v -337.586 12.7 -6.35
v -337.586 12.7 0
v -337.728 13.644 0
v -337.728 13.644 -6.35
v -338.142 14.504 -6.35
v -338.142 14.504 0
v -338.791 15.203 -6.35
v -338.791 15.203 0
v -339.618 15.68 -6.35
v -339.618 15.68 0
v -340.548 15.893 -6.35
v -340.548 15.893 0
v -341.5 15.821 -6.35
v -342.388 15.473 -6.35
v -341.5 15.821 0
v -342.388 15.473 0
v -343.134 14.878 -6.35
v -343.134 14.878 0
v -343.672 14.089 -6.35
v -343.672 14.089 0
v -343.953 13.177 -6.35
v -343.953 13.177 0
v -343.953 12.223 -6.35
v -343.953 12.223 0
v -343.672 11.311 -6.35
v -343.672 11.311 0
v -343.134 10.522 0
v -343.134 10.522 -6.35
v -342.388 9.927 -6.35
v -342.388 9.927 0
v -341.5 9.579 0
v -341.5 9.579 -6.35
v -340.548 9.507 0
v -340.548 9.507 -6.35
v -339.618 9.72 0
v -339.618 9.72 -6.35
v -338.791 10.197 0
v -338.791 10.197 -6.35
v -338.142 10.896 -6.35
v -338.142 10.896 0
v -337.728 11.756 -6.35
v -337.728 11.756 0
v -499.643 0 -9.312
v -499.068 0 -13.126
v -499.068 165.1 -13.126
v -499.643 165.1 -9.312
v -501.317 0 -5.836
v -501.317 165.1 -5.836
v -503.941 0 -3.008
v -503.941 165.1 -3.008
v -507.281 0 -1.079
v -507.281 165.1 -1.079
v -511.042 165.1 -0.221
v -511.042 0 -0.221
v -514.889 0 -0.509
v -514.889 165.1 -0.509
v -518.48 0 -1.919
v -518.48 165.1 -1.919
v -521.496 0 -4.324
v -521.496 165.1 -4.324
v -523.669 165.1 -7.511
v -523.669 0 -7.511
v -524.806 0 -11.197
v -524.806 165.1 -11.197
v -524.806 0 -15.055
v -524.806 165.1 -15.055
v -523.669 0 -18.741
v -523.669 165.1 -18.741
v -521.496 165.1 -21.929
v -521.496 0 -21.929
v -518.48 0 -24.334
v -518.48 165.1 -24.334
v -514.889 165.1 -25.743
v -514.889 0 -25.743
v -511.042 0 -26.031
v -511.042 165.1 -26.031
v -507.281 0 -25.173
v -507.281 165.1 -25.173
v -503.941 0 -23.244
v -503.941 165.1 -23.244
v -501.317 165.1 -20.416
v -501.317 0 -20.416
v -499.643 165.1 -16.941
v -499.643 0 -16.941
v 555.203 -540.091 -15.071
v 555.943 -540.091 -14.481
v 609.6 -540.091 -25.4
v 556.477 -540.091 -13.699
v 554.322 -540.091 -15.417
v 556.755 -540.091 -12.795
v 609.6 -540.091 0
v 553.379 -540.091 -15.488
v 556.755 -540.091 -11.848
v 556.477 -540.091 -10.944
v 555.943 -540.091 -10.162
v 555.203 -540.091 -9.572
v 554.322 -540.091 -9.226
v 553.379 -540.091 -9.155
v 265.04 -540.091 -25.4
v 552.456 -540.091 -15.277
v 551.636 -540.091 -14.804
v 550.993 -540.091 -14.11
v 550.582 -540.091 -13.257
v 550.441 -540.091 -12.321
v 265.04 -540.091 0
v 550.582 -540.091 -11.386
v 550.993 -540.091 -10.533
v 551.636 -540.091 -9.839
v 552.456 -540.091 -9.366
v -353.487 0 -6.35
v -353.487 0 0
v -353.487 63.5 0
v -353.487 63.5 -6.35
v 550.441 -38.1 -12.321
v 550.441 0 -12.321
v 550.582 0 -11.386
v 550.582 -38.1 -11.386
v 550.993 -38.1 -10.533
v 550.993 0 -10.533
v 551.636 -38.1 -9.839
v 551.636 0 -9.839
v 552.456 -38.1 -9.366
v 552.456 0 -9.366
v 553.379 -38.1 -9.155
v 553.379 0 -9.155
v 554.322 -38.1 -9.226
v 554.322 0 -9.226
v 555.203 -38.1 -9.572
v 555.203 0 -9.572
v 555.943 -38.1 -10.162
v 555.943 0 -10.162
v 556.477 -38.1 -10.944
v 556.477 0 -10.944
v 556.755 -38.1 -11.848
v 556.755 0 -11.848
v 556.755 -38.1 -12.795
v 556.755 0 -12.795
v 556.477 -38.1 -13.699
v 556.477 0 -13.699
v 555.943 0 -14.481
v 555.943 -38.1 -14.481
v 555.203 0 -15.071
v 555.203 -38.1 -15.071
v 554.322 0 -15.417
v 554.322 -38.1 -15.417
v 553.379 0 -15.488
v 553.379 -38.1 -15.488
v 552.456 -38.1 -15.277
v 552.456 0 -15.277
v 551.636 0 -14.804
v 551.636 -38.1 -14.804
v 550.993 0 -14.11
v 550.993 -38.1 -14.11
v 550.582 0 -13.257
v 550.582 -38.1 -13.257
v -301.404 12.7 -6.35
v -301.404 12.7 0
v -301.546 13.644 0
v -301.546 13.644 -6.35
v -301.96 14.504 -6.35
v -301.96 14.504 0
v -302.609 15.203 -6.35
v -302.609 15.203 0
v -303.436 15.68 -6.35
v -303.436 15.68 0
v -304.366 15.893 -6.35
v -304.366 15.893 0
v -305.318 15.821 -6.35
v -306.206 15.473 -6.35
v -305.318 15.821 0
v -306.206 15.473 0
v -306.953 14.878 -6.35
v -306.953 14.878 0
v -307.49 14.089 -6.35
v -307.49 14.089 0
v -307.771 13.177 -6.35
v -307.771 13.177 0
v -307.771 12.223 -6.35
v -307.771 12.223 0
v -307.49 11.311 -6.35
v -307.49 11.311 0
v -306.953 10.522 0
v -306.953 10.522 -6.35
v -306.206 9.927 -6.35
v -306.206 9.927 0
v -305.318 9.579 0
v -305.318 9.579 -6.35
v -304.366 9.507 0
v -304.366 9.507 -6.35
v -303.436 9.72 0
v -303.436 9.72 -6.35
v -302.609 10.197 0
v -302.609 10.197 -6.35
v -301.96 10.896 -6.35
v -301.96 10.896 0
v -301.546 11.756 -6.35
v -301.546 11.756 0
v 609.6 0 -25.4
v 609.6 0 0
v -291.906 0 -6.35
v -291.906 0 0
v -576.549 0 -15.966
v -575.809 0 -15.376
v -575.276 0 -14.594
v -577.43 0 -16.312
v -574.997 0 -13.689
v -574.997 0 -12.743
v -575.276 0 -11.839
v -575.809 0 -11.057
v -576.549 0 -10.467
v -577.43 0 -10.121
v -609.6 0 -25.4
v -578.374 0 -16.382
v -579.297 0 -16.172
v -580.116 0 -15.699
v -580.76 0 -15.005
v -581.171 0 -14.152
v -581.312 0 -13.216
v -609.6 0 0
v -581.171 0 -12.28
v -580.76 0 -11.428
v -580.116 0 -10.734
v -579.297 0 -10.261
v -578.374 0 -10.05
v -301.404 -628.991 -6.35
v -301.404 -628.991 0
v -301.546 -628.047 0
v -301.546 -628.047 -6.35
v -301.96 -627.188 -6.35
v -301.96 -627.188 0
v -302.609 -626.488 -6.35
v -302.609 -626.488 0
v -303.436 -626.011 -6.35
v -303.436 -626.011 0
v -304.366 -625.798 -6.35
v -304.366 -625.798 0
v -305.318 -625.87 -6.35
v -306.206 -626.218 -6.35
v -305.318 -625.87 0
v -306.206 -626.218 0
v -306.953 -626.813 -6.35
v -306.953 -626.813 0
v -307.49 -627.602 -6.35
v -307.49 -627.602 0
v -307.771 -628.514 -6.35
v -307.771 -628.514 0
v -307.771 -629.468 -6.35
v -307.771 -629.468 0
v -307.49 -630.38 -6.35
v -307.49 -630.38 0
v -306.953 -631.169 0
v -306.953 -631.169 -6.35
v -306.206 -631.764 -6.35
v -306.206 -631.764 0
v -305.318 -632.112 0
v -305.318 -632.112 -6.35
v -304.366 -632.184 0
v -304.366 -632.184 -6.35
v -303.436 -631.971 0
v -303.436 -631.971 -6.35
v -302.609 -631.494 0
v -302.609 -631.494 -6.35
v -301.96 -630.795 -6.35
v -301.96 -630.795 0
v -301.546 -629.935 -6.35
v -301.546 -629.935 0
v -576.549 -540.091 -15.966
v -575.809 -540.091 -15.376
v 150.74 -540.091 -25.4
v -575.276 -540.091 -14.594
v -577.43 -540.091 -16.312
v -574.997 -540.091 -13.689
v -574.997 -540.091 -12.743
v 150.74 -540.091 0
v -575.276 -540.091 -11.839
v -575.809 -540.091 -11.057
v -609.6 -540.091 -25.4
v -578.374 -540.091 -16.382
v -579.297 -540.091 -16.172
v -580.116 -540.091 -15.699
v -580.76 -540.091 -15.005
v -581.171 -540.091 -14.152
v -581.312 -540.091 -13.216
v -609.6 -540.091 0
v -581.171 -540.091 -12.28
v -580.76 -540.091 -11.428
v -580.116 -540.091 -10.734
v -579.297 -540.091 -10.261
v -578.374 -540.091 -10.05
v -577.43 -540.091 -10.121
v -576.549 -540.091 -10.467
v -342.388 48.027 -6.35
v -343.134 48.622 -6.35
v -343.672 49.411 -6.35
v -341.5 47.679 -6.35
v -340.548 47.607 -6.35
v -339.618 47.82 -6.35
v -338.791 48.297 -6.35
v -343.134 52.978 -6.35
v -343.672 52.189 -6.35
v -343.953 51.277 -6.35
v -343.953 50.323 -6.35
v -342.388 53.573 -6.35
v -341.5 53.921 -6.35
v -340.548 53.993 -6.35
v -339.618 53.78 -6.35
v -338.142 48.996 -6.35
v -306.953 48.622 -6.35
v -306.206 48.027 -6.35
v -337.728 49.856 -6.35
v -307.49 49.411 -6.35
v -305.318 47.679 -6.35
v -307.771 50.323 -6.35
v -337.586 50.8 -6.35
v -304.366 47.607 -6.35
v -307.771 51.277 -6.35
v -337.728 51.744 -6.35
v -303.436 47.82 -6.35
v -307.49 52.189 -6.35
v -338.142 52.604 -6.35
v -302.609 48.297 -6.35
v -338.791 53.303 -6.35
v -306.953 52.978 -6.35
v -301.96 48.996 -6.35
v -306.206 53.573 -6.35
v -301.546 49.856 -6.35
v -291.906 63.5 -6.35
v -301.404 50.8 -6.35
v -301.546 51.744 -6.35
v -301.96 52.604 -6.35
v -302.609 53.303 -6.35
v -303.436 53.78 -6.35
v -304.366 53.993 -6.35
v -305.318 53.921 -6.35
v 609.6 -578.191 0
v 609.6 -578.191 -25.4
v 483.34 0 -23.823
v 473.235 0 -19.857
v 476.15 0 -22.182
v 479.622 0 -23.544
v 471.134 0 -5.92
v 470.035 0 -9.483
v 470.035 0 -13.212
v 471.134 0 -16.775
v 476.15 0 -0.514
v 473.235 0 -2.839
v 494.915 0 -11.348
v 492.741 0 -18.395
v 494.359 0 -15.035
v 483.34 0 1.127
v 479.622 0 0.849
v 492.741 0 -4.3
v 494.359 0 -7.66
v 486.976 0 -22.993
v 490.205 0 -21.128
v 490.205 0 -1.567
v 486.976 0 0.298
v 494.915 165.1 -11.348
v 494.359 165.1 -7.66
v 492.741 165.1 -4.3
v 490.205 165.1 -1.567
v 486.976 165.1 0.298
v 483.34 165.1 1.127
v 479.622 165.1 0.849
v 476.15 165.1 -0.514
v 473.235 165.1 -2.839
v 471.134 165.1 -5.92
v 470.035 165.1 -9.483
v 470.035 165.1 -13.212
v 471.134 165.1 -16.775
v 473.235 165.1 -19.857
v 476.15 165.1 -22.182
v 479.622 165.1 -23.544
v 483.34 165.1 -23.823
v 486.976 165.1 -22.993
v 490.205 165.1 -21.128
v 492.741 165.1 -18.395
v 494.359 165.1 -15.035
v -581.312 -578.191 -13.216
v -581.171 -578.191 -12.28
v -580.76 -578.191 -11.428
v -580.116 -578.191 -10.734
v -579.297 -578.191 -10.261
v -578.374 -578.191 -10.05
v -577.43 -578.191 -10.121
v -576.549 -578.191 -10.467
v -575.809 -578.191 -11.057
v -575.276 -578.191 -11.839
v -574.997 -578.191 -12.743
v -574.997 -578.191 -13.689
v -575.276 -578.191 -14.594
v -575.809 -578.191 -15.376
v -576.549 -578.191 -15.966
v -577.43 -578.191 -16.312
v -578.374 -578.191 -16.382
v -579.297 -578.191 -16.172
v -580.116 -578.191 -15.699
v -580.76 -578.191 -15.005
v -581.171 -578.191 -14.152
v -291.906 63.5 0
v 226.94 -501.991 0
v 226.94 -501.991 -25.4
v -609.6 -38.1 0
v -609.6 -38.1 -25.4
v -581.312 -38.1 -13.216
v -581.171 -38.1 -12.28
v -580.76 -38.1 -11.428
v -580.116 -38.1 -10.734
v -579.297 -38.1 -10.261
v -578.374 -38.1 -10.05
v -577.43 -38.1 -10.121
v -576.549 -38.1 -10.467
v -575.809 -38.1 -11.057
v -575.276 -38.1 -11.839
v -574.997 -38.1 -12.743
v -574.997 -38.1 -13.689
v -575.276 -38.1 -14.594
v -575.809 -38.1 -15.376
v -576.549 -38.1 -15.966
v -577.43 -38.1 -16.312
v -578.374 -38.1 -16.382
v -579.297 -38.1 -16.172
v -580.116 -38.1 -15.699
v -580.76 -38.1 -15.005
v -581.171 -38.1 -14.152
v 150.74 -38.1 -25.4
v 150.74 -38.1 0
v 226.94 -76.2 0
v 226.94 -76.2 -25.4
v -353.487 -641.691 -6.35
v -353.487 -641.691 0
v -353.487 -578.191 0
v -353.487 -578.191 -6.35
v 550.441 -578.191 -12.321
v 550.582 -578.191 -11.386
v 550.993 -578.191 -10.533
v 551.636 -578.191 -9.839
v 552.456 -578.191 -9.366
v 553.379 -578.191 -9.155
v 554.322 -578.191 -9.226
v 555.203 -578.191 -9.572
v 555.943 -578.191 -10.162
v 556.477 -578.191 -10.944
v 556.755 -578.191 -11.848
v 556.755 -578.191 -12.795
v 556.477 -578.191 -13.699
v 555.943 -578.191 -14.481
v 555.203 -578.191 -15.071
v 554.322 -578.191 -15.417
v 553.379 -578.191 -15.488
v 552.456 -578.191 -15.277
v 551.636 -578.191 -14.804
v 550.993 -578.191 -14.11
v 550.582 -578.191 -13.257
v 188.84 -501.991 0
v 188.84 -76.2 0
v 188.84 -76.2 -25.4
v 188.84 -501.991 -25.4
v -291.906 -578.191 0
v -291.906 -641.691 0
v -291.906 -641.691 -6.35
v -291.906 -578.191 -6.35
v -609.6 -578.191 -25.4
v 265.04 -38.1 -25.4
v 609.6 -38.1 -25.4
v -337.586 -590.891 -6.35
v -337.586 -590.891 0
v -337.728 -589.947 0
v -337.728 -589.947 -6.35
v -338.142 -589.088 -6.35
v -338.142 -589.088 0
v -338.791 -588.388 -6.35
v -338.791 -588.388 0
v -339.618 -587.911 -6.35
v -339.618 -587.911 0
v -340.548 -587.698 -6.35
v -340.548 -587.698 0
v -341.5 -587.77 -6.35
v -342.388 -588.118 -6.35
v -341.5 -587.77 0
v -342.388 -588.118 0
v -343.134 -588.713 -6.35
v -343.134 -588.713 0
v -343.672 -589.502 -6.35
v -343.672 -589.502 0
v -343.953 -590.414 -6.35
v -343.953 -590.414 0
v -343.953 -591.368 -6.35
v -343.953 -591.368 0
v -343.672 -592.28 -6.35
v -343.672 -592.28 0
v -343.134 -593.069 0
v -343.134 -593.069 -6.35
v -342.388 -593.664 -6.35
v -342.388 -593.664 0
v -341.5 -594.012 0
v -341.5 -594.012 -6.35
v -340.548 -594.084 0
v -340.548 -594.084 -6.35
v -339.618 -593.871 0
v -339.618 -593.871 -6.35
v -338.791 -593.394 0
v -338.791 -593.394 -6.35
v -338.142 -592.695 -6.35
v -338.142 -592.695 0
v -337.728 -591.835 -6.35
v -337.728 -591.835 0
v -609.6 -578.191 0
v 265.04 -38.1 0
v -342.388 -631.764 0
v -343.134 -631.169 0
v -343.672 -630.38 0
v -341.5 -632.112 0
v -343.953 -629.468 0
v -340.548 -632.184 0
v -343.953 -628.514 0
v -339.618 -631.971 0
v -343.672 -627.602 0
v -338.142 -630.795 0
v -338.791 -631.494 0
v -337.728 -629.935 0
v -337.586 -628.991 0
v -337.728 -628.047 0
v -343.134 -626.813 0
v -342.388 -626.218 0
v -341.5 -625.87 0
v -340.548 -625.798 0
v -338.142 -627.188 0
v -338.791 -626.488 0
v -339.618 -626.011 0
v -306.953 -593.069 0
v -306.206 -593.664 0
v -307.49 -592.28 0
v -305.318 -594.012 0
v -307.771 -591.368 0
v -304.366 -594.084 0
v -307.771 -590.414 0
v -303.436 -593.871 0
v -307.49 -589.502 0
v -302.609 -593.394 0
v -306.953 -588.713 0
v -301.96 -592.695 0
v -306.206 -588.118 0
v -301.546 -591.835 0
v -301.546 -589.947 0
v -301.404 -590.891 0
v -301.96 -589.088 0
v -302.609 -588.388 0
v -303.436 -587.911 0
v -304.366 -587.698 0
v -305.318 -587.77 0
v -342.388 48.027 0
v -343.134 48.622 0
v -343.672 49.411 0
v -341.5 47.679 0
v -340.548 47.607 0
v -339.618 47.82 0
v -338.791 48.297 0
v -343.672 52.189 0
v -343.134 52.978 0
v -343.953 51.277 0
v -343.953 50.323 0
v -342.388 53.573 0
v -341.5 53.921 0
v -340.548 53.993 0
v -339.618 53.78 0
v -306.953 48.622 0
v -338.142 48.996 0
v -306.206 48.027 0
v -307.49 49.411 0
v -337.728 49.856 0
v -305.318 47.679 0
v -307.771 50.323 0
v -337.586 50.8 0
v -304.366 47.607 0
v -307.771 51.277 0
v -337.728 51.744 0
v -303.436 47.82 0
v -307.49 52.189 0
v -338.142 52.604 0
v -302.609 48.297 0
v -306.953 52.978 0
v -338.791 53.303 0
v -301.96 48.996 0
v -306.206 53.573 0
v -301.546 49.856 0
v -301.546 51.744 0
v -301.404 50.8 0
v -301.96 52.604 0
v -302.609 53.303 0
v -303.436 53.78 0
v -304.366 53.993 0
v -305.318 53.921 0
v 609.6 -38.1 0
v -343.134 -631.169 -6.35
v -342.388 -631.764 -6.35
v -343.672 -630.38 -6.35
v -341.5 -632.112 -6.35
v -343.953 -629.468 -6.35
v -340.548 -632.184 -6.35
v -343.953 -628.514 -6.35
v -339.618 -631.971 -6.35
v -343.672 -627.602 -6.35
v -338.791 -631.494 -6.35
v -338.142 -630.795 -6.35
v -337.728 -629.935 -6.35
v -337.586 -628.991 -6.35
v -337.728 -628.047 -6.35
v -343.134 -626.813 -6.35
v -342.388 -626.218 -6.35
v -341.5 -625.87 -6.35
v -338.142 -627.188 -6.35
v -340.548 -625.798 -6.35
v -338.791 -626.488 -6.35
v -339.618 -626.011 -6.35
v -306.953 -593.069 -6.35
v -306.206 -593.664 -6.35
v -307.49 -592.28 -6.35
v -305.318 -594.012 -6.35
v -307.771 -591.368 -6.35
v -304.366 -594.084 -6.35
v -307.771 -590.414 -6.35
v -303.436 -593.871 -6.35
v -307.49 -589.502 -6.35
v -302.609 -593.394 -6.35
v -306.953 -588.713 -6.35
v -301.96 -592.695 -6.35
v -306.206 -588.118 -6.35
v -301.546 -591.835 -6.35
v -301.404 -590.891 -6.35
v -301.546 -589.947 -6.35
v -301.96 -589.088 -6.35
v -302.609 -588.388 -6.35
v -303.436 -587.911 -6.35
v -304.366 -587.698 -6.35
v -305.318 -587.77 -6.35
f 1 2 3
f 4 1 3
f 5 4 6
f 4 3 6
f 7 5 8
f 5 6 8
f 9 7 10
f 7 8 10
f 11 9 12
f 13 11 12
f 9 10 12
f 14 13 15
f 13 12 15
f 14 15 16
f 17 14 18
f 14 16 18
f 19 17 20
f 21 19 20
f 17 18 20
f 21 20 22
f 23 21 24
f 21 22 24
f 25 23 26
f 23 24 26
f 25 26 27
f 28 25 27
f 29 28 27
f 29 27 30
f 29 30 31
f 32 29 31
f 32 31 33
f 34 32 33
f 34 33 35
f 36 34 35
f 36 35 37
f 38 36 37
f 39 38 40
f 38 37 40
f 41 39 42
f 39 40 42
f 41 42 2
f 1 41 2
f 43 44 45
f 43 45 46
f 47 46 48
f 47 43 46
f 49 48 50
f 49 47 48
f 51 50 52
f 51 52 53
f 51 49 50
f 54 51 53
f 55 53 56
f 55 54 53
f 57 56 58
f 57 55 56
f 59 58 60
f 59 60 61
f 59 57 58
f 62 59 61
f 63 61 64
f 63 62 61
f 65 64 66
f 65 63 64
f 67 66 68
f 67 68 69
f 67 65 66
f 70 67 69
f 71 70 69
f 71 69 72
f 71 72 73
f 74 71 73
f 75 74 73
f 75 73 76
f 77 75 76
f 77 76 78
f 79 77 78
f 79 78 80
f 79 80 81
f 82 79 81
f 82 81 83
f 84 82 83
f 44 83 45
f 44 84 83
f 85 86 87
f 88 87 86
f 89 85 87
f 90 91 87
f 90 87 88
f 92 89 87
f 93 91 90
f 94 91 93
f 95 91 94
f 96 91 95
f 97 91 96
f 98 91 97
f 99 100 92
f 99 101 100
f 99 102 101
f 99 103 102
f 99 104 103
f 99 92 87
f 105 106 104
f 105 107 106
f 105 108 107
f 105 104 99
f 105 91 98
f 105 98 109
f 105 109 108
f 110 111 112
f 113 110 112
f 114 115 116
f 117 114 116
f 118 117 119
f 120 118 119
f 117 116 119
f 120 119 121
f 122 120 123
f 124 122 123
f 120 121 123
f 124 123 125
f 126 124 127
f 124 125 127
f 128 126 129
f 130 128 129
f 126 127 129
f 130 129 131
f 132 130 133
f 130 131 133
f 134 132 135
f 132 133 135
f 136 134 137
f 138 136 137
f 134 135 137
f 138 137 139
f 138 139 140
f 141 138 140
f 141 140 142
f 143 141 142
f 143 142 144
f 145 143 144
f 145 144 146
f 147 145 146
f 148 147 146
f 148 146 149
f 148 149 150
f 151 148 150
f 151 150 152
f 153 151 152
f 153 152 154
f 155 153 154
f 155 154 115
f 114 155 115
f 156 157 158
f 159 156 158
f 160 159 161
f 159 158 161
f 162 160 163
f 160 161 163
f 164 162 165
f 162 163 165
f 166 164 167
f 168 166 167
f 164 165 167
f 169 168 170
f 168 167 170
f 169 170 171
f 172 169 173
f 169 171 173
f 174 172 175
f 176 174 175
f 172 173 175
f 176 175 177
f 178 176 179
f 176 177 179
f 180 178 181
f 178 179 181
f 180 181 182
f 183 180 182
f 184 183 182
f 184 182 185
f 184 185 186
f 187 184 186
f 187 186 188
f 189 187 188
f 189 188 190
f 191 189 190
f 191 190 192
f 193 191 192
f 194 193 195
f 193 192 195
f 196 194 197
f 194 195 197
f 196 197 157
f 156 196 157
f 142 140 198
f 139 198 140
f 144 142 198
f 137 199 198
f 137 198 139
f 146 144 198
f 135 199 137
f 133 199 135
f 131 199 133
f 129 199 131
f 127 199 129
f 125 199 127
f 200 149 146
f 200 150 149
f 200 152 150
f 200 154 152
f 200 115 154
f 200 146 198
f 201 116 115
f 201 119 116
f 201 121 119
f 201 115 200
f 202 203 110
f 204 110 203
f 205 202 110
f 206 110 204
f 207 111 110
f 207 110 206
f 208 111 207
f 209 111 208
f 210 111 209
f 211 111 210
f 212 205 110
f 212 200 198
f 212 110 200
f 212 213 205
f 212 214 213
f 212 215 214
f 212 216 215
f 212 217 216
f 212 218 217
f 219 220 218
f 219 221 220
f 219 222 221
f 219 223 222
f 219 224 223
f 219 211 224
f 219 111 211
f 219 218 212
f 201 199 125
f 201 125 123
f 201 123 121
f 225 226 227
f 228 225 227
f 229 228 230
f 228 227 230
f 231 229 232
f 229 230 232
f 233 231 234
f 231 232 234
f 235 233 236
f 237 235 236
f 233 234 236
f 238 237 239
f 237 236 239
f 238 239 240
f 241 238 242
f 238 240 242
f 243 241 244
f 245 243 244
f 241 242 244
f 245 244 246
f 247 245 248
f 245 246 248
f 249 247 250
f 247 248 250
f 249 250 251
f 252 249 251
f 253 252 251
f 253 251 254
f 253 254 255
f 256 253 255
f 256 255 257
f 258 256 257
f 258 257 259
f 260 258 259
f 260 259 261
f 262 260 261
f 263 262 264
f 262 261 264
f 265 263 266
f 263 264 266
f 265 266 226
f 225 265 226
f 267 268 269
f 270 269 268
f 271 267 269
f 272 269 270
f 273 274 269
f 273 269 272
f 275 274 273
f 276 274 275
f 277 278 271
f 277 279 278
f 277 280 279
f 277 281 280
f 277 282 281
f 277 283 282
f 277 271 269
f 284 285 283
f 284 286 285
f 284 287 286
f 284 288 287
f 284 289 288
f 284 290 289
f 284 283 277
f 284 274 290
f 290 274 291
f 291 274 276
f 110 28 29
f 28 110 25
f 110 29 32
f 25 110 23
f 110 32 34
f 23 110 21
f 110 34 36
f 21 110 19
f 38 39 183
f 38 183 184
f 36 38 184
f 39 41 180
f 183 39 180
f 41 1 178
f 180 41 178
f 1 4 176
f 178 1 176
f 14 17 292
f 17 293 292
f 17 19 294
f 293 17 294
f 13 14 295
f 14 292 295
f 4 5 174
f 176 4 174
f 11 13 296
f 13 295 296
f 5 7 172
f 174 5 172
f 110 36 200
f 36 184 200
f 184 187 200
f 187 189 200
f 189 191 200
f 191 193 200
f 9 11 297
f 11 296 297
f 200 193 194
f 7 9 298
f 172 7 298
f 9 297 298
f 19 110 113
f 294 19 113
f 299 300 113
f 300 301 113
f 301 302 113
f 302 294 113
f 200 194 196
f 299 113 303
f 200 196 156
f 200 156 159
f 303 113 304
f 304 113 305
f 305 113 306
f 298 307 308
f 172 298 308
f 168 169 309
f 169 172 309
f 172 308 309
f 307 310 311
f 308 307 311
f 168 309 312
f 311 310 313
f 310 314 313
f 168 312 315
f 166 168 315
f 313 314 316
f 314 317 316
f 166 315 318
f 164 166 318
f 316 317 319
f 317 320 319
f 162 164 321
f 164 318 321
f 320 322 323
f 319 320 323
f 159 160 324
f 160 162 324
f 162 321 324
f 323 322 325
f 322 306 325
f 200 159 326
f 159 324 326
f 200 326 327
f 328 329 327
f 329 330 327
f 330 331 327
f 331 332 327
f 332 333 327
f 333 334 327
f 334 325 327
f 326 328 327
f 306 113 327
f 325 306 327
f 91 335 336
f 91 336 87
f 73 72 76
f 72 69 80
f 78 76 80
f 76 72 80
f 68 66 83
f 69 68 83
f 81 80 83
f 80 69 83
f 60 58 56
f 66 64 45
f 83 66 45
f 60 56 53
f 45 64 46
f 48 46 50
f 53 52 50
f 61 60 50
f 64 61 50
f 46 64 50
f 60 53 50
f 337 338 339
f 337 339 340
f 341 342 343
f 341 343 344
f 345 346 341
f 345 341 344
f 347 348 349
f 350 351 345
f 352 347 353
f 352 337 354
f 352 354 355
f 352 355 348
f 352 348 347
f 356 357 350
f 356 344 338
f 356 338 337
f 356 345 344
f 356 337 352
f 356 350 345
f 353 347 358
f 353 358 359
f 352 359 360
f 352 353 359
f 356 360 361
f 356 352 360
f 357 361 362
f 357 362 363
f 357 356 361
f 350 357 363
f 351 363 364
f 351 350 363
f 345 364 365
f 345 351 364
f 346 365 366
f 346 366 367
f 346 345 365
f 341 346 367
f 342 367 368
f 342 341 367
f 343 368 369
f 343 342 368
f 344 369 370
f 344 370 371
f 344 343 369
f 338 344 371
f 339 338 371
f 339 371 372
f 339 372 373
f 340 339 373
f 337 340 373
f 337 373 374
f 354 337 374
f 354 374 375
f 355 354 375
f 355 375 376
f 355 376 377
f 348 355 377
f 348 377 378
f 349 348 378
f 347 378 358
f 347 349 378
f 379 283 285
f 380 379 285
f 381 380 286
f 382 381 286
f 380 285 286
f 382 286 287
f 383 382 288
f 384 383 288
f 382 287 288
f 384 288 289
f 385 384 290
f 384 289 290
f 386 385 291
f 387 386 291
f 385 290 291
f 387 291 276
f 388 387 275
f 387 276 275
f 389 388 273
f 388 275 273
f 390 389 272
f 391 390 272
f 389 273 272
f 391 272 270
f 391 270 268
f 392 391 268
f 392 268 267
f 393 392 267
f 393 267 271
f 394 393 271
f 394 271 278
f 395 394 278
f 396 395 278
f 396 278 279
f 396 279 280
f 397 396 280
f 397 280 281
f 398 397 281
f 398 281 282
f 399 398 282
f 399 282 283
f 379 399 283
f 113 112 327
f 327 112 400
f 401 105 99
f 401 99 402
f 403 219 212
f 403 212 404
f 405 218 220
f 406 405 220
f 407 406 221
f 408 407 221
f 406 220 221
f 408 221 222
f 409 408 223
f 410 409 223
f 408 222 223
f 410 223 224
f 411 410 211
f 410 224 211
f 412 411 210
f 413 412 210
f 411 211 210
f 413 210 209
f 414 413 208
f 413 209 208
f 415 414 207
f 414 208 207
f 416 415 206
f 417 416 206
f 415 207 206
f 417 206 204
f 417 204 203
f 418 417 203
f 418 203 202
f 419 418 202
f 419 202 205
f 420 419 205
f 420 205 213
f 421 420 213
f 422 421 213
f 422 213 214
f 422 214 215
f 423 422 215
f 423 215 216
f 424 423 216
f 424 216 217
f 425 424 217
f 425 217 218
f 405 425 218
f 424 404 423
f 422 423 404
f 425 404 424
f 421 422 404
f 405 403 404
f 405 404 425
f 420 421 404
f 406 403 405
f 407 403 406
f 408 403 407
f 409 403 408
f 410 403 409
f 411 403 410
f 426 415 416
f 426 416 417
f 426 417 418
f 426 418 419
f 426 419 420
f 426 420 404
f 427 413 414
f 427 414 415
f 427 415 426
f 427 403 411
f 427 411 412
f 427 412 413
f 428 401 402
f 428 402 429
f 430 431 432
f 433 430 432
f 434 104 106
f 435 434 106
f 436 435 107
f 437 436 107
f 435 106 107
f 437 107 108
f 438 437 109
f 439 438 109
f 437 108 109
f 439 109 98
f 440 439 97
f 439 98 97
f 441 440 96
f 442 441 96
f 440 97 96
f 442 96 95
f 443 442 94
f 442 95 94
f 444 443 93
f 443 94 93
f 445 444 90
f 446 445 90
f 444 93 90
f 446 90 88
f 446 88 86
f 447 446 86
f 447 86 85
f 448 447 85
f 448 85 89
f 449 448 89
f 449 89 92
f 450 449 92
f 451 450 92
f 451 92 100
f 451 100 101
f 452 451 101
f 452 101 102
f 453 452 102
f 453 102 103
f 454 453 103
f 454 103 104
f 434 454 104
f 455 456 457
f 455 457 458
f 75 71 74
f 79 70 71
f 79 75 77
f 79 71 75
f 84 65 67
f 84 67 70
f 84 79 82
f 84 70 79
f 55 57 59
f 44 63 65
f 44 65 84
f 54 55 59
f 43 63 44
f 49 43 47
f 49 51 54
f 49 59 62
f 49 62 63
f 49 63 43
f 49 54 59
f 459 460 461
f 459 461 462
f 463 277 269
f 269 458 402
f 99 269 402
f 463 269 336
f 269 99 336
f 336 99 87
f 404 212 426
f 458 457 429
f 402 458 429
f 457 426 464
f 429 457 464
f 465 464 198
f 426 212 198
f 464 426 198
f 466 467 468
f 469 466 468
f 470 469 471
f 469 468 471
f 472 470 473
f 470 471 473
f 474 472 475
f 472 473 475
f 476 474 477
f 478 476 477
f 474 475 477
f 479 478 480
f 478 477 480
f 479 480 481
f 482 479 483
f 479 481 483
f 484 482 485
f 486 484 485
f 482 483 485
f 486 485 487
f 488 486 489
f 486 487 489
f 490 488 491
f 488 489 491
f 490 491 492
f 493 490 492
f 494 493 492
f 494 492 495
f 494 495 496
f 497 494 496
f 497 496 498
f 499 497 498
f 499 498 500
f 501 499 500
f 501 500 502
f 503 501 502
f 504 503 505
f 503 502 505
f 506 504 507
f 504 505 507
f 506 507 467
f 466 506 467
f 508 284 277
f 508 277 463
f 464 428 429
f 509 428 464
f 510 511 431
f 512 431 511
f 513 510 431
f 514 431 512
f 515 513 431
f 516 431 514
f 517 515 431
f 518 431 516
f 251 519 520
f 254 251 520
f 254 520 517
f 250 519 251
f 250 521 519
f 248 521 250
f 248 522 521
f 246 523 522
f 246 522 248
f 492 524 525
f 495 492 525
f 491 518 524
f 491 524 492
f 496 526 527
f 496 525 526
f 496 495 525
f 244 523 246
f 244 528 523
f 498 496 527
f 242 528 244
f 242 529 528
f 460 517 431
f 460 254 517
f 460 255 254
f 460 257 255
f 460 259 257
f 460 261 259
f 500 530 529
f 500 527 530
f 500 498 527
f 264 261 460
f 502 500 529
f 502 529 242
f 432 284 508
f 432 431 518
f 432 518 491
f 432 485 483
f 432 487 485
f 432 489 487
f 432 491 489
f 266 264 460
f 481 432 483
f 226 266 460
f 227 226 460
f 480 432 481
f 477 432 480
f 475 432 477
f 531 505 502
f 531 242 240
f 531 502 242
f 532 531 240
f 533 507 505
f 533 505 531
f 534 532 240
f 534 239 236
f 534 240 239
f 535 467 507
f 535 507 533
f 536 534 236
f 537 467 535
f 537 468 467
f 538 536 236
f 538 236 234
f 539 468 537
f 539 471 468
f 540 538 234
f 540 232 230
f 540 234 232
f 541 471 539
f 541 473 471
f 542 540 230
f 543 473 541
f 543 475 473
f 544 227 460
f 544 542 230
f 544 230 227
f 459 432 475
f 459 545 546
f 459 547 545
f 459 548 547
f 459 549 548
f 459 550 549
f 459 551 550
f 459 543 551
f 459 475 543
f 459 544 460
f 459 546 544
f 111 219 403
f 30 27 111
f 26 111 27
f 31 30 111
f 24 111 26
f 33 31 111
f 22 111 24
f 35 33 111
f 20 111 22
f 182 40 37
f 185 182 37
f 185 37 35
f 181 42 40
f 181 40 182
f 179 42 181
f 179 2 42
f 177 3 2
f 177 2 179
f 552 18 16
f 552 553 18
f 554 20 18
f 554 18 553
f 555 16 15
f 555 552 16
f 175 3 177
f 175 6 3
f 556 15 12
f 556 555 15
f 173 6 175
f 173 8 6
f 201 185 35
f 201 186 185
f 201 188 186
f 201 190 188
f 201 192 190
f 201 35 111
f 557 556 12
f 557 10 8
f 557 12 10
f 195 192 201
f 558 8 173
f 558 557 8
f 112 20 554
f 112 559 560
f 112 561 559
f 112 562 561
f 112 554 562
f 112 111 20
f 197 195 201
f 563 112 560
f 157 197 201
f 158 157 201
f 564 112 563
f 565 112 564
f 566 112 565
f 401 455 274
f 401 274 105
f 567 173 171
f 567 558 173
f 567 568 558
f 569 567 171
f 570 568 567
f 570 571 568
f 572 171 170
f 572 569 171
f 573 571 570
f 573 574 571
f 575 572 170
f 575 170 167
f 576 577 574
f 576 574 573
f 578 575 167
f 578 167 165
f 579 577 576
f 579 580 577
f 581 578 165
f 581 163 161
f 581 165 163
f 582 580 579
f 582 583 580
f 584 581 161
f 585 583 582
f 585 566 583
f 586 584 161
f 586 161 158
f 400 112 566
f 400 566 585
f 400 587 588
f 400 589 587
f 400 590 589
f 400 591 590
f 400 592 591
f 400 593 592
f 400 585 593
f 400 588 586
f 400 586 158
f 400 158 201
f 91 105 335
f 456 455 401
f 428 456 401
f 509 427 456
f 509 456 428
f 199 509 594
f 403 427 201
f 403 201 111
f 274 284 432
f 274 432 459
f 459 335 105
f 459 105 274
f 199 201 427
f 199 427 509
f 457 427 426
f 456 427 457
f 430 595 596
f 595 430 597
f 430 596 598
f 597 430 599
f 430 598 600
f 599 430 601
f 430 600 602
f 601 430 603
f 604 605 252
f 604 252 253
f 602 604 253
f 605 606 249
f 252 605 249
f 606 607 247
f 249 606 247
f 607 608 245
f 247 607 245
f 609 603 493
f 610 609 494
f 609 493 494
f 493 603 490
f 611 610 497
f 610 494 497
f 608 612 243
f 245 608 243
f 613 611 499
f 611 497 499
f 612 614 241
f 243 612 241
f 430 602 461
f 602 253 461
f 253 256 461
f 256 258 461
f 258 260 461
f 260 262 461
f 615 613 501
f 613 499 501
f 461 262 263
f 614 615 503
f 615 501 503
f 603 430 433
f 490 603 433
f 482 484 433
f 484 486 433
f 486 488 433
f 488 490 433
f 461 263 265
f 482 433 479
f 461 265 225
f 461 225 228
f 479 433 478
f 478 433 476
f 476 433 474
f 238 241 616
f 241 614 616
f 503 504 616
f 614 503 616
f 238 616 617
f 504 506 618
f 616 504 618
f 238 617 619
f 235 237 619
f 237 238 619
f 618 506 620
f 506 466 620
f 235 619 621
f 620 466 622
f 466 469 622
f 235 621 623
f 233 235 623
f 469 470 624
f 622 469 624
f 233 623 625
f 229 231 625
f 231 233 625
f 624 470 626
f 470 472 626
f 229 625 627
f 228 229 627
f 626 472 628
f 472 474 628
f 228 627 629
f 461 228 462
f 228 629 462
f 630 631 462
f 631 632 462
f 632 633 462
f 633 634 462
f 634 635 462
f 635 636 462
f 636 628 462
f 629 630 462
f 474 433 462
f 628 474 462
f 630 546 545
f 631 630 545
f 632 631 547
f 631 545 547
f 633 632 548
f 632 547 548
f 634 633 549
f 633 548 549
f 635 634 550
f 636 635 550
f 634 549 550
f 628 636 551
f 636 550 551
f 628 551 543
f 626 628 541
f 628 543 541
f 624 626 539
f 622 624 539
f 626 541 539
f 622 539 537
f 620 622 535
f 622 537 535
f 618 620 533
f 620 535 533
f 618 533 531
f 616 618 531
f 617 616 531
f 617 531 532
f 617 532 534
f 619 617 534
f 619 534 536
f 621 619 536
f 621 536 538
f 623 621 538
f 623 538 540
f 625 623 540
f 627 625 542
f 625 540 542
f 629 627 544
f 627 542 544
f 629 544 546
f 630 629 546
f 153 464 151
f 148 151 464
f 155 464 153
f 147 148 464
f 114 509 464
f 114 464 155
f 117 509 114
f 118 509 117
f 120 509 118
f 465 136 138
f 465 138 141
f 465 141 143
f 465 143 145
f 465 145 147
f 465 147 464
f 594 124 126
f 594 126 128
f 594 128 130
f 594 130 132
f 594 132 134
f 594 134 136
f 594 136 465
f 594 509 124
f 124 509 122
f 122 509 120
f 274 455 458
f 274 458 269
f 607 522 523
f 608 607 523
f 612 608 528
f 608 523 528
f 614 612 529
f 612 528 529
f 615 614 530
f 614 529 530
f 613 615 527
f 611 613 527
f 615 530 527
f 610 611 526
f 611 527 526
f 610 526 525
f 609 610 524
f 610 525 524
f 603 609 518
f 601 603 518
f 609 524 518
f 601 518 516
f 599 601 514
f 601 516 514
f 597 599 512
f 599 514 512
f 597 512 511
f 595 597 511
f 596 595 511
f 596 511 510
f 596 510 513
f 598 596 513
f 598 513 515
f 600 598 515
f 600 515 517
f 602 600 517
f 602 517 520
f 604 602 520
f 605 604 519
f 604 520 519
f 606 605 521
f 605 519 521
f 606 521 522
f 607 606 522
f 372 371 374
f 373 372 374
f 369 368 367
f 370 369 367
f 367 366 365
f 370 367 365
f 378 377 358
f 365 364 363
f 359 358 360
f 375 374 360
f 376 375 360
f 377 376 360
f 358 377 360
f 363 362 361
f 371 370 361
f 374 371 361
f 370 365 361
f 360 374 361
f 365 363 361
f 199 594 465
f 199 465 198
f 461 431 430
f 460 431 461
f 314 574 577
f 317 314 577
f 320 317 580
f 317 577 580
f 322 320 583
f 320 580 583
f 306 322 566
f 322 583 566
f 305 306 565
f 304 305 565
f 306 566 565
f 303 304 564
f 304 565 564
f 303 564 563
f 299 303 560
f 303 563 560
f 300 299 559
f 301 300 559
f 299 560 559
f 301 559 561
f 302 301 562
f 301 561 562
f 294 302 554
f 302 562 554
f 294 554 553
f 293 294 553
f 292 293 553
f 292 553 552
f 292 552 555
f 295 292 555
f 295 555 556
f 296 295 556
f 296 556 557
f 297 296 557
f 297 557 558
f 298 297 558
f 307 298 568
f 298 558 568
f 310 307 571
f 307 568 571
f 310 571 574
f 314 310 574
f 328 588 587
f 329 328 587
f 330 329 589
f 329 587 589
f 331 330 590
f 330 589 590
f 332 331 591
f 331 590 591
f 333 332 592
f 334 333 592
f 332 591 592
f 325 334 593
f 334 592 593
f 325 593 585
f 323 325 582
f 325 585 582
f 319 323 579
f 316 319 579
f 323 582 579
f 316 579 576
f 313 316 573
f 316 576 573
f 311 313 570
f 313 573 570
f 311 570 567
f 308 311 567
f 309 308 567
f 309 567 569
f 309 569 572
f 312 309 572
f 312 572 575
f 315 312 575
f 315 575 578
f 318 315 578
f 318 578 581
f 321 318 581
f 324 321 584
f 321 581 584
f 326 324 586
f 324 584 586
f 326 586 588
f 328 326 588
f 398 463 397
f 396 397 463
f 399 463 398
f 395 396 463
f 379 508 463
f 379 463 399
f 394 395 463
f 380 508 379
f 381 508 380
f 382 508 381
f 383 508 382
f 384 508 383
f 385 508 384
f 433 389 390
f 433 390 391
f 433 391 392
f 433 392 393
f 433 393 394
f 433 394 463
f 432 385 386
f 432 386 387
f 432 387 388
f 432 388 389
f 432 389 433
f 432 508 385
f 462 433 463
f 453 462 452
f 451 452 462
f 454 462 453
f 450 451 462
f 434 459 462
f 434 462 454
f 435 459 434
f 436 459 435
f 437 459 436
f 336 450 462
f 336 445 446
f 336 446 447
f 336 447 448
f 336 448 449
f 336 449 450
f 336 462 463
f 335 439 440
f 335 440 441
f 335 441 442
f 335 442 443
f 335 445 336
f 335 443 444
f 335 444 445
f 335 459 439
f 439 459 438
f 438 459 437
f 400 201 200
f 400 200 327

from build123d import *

# Parameters (mm, degrees)
F1_DEPTH = 25.4
F0_W     = 61.5815903664
F0_H     = 63.5
F0_R     = 3.2016098653
F2_DEPTH = 6.35
F4_D     = 6.35
F5_D     = 6.35
F6_R     = 12.509972913
F7_DEPTH = 165.1
F8_R     = 12.94146472
F9_DEPTH = 165.1


with BuildPart() as f1:
    # F0 (on Top) → F1 (new body)
    with BuildSketch(Plane.XY):
        Polygon((-353.4871935844, 0), (-609.6, 0), (-609.6, -38.1), (150.7397797585, -38.1), (188.8397797585, -38.1), (226.9397797585, -38.1), (265.0397797585, -38.1), (609.6, -38.1), (609.6, 0), (-291.9056032181, 0), align=None)
        Polygon((226.9397797585, -540.0910377502), (188.8397797585, -540.0910377502), (150.7397797585, -540.0910377502), (-609.6, -540.0910377502), (-609.6, -578.1910377502), (-353.4871935844, -578.1910377502), (-291.9056032181, -578.1910377502), (609.6, -578.1910377502), (609.6, -540.0910377502), (265.0397797585, -540.0910377502), align=None)
        Polygon((188.8397797585, -540.0910377502), (188.8397797585, -501.9910377502), (150.7397797585, -540.0910377502), align=None)
        Polygon((265.0397797585, -540.0910377502), (226.9397797585, -501.9910377502), (226.9397797585, -540.0910377502), align=None)
        Polygon((226.9397797585, -38.1), (188.8397797585, -38.1), (188.8397797585, -76.2), (188.8397797585, -501.9910377502), (188.8397797585, -540.0910377502), (226.9397797585, -540.0910377502), (226.9397797585, -501.9910377502), (226.9397797585, -76.2), align=None)
        Polygon((188.8397797585, -38.1), (150.7397797585, -38.1), (188.8397797585, -76.2), align=None)
        Polygon((265.0397797585, -38.1), (226.9397797585, -38.1), (226.9397797585, -76.2), align=None)
    extrude(amount=-F1_DEPTH)

    # F0 (on Top) → F2 (join)
    with BuildSketch(Plane.XY):
        with Locations((-322.6963984013, -609.9410377502)):
            Rectangle(F0_W, F0_H)
        with Locations((-340.7871935844, -628.9910377502)):
            Circle(F0_R, mode=Mode.SUBTRACT)
        with Locations((-340.7871935844, -590.8910377502)):
            Circle(F0_R, mode=Mode.SUBTRACT)
        with Locations((-304.6056032181, -628.9910377502)):
            Circle(F0_R, mode=Mode.SUBTRACT)
        with Locations((-304.6056032181, -590.8910377502)):
            Circle(F0_R, mode=Mode.SUBTRACT)
        with Locations((-322.6963984013, 31.75)):
            Rectangle(F0_W, F0_H)
        with Locations((-340.7871935844, 12.7)):
            Circle(F0_R, mode=Mode.SUBTRACT)
        with Locations((-340.7871935844, 50.8)):
            Circle(F0_R, mode=Mode.SUBTRACT)
        with Locations((-304.6056032181, 12.7)):
            Circle(F0_R, mode=Mode.SUBTRACT)
        with Locations((-304.6056032181, 50.8)):
            Circle(F0_R, mode=Mode.SUBTRACT)
    extrude(amount=-F2_DEPTH)

    # F4 (through all)
    with Locations(Plane.XZ.offset(578.1910377502)):
        with Locations((-578.1368017197, -13.2161937654)):
            Hole(F4_D / 2)

    # F5 (through all)
    with Locations(Plane.XZ.offset(578.1910377502)):
        with Locations((553.6159609795, -12.3214880005)):
            Hole(F5_D / 2)


with BuildPart() as f7:
    # F6 (on Front) → F7 (new body)
    with BuildSketch(Plane.XZ):
        with Locations((482.4052453041, -11.3475965336)):
            Circle(F6_R)
    extrude(amount=-F7_DEPTH)


with BuildPart() as f9:
    # F8 (on Front) → F9 (new body)
    with BuildSketch(Plane.XZ):
        with Locations((-512.0095014572, -13.1261823699)):
            Circle(F8_R)
    extrude(amount=-F9_DEPTH)


solid = Compound([f1.part, f7.part, f9.part])
